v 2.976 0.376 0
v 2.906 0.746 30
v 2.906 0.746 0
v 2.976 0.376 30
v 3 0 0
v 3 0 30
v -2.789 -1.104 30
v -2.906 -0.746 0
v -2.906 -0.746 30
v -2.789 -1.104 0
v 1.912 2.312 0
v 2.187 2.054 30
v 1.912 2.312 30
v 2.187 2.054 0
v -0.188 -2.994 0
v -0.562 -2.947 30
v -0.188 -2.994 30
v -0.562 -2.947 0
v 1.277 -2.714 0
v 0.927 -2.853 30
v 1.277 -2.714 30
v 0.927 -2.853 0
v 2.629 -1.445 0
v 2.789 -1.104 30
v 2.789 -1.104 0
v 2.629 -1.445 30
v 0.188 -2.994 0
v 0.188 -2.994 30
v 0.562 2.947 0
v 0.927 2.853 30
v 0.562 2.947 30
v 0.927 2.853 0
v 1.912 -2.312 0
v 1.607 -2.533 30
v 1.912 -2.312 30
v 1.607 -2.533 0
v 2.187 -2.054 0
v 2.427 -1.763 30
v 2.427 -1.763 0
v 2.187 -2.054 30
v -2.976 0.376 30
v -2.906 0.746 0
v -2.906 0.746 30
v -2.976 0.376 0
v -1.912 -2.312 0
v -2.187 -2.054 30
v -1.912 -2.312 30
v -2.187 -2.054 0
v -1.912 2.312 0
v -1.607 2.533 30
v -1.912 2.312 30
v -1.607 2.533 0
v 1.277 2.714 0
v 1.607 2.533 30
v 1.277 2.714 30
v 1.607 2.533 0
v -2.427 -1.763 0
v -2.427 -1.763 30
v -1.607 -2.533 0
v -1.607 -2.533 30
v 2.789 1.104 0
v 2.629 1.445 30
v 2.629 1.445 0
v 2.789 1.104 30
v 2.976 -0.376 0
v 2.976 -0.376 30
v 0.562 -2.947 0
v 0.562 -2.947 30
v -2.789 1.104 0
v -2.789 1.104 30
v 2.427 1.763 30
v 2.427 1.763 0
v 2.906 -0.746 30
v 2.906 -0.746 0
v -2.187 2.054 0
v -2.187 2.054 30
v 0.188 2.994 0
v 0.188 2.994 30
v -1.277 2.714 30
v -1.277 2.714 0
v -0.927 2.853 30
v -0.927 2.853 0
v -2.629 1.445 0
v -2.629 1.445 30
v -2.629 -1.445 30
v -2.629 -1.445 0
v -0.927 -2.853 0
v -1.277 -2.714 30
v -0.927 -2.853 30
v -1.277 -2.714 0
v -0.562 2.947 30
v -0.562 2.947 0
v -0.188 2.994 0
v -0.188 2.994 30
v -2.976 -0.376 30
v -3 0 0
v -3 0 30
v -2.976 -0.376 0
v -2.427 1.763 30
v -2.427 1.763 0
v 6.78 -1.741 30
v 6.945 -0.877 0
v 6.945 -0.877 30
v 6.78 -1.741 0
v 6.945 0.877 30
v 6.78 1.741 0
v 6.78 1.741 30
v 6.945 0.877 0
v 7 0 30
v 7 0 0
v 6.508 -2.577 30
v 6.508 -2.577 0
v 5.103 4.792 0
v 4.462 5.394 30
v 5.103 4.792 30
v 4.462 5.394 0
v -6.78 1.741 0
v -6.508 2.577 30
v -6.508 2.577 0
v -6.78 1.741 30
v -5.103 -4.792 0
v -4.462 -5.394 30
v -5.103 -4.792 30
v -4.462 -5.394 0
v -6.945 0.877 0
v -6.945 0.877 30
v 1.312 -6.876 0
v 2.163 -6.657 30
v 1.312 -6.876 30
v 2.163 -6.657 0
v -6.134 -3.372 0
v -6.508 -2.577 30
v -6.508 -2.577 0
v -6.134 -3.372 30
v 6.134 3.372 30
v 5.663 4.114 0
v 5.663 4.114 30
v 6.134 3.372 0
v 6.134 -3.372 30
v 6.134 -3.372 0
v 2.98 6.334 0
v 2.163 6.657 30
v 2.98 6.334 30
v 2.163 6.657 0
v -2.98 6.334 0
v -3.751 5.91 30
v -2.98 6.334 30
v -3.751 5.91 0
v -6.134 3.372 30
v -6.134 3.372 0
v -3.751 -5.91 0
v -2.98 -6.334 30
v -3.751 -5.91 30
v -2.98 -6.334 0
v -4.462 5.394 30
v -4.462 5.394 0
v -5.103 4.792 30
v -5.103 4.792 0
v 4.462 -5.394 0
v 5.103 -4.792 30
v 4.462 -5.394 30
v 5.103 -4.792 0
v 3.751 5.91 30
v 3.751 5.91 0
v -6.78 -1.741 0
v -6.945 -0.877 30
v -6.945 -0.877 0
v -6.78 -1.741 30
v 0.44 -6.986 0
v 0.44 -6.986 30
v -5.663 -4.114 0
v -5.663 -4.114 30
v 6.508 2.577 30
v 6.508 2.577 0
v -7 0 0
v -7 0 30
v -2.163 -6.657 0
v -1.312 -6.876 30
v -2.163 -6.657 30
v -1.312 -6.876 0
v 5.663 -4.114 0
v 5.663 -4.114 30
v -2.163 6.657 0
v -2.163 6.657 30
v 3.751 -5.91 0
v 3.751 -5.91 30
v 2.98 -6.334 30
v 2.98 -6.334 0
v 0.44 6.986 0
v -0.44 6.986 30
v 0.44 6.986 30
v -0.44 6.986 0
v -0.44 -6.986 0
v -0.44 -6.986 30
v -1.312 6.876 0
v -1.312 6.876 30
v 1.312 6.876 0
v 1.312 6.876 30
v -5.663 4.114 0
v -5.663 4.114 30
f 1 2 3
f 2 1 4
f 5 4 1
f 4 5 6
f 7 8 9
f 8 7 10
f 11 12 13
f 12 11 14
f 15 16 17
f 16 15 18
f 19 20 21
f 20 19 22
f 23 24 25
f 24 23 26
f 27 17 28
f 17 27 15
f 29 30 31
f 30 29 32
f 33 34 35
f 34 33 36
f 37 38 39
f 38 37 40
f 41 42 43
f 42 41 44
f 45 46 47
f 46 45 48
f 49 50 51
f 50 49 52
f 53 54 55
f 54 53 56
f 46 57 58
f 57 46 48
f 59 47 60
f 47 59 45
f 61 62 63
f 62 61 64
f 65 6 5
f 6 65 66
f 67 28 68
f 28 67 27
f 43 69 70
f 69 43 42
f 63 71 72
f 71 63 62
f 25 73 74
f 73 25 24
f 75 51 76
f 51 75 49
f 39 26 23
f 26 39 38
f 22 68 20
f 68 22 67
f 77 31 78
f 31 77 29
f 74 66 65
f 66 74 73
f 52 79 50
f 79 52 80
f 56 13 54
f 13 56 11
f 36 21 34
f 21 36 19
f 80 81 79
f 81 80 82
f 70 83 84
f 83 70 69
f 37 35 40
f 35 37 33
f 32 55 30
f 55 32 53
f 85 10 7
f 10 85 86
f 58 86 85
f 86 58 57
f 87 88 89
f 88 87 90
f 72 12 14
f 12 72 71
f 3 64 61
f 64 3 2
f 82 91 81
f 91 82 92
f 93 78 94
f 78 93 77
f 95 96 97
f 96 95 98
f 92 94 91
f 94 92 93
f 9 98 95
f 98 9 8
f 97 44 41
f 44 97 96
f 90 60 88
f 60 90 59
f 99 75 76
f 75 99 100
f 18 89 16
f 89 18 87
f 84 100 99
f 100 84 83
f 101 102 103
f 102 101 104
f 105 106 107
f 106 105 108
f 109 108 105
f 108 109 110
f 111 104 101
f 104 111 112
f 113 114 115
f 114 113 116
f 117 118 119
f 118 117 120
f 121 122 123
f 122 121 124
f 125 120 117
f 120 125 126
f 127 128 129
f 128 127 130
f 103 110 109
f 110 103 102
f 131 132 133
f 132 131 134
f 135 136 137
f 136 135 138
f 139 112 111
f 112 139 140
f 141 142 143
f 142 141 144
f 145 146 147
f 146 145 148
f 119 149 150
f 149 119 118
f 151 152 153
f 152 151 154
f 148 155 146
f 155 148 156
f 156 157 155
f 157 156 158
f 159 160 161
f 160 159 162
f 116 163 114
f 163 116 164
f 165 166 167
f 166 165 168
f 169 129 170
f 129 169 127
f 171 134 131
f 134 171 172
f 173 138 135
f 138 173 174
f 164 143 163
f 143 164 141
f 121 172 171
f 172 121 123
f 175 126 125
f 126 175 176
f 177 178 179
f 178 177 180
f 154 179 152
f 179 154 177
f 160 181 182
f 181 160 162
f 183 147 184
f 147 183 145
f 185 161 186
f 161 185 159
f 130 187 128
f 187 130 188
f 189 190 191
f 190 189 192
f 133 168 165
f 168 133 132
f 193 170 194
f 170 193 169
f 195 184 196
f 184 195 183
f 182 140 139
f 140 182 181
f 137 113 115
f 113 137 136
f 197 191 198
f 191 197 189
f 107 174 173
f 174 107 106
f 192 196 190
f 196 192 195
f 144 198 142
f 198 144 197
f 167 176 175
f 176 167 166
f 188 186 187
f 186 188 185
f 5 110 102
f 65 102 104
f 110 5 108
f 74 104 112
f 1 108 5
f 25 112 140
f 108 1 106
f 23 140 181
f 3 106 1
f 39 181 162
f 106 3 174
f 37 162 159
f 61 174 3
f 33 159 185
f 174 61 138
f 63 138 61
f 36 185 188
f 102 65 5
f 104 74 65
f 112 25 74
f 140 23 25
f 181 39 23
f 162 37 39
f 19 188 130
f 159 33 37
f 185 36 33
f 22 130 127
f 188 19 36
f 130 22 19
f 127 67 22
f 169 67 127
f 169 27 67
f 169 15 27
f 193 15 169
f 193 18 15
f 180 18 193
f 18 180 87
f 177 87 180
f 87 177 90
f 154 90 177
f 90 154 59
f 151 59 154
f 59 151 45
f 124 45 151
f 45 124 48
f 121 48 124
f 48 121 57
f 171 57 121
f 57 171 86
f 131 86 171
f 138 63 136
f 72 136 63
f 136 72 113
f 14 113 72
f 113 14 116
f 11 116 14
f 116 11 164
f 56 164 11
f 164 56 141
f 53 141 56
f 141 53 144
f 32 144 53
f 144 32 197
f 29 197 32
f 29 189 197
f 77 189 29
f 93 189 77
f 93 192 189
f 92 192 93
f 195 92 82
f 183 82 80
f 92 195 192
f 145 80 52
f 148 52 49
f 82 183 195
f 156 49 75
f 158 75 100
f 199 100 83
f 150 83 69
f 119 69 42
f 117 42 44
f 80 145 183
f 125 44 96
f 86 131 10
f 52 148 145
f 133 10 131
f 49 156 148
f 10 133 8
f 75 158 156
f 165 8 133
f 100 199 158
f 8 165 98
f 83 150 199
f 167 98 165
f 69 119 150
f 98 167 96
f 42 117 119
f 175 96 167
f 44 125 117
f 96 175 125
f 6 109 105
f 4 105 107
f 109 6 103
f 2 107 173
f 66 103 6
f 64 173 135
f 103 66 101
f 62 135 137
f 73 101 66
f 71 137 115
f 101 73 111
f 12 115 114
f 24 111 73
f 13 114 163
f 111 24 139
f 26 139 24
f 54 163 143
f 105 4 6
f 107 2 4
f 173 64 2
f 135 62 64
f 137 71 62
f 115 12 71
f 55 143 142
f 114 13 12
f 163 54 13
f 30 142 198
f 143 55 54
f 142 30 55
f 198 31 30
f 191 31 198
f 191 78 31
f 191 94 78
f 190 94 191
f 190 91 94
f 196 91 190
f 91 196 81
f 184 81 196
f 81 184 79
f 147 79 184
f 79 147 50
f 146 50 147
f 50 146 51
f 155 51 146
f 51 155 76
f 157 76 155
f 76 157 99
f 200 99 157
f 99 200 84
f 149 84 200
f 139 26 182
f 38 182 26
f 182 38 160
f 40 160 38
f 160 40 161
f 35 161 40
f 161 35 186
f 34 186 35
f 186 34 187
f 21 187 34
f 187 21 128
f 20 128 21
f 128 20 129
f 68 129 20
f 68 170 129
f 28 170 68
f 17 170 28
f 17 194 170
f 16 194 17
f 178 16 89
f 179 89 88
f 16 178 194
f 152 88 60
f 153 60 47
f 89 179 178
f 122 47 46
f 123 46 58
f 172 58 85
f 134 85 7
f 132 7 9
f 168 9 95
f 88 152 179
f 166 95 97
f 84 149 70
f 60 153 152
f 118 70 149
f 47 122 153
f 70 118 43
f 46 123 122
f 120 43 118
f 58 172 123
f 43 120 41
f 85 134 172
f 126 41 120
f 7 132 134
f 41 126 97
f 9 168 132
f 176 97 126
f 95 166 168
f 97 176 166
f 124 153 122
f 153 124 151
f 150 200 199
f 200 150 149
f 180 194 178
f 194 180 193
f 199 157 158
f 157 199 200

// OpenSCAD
$fn = 50;


difference() {
	union() {
		cylinder(h = 30, r = 7.0000000000);
	}
	union() {
		translate(v = [0, 0, -100]) {
			cylinder(h = 200, r = 3.0000000000);
		}
		translate(v = [0, 0, -100]) {
			cylinder(h = 200, r = 1.5000000000);
		}
	}
}
